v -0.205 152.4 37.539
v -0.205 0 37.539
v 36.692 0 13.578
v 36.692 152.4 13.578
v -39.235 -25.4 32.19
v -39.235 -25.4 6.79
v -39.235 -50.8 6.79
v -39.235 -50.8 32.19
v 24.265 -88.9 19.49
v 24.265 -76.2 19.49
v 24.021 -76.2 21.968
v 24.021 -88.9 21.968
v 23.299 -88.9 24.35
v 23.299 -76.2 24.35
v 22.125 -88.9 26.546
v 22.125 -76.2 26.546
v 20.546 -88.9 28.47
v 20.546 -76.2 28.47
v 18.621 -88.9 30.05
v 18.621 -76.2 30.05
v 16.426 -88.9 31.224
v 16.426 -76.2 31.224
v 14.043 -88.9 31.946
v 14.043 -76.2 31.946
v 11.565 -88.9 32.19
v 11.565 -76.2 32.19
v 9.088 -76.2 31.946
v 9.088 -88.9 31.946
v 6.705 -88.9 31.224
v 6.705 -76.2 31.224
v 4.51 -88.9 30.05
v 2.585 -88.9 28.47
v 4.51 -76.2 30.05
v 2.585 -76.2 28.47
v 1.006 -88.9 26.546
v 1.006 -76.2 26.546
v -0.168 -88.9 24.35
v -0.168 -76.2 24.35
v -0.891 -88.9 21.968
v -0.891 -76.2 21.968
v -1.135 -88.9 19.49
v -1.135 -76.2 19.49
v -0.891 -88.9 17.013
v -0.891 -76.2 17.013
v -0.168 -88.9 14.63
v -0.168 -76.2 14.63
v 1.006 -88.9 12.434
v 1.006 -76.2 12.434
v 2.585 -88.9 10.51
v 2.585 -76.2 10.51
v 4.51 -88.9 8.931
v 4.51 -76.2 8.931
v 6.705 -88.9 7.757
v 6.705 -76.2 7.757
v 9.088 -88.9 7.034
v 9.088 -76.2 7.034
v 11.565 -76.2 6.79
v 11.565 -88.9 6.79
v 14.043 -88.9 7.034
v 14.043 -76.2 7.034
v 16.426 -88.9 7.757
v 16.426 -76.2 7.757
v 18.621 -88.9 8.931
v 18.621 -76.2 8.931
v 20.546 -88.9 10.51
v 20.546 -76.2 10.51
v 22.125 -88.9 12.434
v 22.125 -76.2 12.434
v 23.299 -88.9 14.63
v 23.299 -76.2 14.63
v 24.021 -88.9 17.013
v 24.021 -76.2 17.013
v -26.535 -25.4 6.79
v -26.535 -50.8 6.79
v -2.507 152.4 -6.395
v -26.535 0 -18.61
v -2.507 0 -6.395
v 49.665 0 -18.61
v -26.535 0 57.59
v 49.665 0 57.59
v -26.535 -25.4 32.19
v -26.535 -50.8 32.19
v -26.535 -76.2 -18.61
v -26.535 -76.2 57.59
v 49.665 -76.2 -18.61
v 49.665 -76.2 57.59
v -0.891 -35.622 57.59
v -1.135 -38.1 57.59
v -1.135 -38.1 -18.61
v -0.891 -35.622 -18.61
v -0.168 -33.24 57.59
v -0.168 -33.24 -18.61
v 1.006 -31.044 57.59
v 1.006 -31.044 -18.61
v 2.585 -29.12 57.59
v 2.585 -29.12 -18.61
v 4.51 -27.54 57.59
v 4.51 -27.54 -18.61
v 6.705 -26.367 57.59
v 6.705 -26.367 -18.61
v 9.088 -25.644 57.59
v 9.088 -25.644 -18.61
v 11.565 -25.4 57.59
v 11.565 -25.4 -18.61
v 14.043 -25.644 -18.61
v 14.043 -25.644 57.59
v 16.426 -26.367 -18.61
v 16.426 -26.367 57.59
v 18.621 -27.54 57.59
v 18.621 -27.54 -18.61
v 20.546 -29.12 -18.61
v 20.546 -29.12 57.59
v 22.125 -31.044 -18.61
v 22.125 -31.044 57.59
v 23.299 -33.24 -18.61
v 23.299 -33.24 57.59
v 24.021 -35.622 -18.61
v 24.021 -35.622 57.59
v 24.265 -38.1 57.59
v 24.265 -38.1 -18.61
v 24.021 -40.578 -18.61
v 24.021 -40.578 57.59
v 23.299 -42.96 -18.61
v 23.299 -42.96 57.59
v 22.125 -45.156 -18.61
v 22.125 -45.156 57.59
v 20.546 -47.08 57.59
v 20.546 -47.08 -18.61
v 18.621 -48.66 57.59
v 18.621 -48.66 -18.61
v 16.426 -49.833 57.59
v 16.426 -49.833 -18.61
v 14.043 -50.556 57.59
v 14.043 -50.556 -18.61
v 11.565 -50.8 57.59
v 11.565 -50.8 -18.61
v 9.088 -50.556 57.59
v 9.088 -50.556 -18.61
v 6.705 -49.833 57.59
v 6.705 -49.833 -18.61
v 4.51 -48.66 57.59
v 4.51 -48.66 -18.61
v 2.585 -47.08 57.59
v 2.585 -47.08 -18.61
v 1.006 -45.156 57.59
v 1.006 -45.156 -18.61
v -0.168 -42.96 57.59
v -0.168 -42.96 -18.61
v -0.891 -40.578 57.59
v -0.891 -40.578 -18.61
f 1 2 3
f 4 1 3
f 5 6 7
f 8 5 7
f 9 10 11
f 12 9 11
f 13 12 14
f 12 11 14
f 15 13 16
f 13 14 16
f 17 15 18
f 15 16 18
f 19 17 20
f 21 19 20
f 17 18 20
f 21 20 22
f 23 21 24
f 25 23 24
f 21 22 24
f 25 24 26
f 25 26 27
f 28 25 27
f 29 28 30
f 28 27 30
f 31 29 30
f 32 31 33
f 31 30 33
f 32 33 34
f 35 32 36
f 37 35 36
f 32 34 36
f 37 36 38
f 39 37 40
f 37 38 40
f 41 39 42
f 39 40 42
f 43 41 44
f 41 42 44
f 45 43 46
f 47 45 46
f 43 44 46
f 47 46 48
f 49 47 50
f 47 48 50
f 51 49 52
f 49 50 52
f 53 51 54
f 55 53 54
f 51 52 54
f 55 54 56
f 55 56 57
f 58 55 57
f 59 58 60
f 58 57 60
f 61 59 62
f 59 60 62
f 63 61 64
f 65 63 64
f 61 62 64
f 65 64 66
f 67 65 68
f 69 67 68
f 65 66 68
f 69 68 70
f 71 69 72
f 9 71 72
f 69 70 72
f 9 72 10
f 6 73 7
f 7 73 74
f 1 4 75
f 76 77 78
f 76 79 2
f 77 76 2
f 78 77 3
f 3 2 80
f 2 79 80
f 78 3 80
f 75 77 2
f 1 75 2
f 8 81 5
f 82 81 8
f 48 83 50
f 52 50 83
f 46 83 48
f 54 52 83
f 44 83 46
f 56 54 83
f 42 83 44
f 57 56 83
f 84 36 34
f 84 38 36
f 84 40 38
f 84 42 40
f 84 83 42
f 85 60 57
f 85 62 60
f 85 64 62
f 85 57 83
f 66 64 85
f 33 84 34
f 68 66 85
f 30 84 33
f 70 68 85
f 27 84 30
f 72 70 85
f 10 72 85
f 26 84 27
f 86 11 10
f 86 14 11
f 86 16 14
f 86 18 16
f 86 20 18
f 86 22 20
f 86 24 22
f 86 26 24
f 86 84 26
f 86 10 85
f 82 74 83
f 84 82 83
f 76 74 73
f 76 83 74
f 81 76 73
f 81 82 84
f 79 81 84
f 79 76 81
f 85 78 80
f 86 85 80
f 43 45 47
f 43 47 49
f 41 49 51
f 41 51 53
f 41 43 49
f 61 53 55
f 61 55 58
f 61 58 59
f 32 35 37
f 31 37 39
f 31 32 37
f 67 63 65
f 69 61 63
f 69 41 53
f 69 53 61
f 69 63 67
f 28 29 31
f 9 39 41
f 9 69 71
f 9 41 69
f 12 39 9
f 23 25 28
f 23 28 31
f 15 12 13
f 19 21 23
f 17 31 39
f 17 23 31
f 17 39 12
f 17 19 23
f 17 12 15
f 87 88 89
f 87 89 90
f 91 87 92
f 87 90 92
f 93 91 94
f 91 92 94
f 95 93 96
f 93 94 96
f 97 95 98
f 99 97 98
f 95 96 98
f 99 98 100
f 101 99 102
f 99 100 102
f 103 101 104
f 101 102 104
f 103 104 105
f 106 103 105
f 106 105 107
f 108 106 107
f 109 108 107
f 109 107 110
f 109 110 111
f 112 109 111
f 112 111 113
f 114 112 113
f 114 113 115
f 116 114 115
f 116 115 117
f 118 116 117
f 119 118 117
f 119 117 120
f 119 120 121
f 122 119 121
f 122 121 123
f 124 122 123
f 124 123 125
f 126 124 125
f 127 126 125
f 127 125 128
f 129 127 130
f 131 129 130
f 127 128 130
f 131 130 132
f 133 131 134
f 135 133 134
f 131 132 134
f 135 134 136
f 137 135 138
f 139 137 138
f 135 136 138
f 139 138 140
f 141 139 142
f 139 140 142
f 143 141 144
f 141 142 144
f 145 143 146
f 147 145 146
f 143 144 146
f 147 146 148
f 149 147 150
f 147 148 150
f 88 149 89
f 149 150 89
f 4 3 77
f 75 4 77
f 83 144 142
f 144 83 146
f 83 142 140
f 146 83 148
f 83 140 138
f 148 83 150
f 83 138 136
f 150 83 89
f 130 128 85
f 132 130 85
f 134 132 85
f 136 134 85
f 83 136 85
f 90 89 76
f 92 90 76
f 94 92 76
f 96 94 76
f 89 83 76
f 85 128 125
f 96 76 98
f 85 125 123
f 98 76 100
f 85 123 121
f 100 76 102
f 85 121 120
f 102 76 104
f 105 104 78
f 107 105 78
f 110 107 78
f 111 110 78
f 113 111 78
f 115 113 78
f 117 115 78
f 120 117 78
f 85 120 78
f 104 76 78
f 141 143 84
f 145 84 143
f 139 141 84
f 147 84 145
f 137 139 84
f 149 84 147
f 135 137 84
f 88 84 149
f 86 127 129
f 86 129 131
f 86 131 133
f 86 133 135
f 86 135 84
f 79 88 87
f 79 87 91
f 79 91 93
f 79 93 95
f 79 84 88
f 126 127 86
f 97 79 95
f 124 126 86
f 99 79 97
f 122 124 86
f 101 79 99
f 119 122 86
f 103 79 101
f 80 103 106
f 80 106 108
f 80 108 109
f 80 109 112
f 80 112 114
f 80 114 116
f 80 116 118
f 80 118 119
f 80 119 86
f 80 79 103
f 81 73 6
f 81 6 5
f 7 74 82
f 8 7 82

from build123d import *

# Parameters (mm, degrees)
F0_W     = 76.2
F0_H     = 76.2
F1_DEPTH = 76.2
F3_D     = 25.4
F4_W     = 25.4
F4_H     = 25.4
F5_DEPTH = 12.7
F6_R     = 12.7
F7_DEPTH = 12.7
F9_DEPTH = 152.4


with BuildPart() as f1:
    # F0 (on Front) → F1 (new body)
    with BuildSketch(Plane.XZ):
        with Locations((11.565426, 19.49024)):
            Rectangle(F0_W, F0_H)
    extrude(amount=F1_DEPTH)

    # F3 (through all)
    with Locations(Plane.XY.offset(57.59024)):
        with Locations((11.565426, -38.1)):
            Hole(F3_D / 2)

    # F4 (on face) → F5 (join)
    with BuildSketch(Plane(origin=(-26.534574, 0, 0), x_dir=(0, -1, 0), z_dir=(-1, 0, 0))):
        with Locations((38.1, 19.49024)):
            Rectangle(F4_W, F4_H)
    extrude(amount=F5_DEPTH)

    # F6 (on face) → F7 (join)
    with BuildSketch(Plane.XZ.offset(76.2)):
        with Locations((11.565426, 19.49024)):
            Circle(F6_R)
    extrude(amount=F7_DEPTH)

    # F8 (on face) → F9 (join)
    with BuildSketch(Plane(origin=(0, 0, 0), x_dir=(-1, 0, 0), z_dir=(0, 1, 0))):
        Polygon((0.204802, 37.538857), (-36.691747, 13.577958), (2.507274, -6.394941), align=None)
    extrude(amount=F9_DEPTH)


solid = f1.part
